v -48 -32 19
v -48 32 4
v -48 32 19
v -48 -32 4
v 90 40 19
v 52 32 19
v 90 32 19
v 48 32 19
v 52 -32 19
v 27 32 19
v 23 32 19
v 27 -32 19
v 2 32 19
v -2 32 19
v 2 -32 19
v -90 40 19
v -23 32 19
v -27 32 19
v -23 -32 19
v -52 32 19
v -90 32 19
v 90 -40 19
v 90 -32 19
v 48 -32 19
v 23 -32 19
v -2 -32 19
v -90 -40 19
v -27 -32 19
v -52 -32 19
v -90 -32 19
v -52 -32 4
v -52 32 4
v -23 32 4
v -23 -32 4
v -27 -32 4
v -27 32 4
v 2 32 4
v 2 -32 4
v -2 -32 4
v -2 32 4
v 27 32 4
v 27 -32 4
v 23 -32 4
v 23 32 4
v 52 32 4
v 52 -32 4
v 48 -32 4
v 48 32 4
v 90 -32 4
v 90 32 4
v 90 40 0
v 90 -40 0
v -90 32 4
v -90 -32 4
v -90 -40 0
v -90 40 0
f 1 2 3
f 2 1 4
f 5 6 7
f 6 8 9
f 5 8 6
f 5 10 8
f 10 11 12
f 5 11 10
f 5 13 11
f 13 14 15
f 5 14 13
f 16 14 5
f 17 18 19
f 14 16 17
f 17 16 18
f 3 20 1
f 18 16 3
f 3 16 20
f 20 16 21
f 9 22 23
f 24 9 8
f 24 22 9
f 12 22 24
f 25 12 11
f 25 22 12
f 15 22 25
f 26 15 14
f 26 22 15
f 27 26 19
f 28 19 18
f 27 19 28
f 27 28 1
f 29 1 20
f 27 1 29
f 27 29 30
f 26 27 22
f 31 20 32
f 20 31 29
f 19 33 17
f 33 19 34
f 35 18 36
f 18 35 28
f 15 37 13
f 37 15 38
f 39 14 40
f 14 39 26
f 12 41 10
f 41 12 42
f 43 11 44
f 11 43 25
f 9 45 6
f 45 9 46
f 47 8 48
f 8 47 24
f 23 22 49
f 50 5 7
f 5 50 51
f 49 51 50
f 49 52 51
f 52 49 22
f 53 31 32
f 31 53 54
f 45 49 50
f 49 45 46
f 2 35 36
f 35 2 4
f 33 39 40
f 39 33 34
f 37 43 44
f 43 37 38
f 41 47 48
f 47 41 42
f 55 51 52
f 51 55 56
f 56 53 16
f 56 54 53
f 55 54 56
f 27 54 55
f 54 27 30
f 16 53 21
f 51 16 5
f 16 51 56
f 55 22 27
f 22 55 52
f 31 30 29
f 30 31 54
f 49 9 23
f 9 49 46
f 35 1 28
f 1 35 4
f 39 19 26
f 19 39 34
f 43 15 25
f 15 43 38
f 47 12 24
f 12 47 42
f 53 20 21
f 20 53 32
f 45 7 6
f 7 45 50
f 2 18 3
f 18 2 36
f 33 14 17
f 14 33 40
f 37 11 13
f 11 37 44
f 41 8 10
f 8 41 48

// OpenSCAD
$fn = 32;

// ----------------------------------------------------------------------
// Rib frame 180 x 80 x 19
// 5 ribs at 25 mm pitch
// ----------------------------------------------------------------------

// --- parameters (mm) ---
frame = [180, 80, 4];  // base plate size (x, y, z)
rail_w = 8;            // side rail width
ribs = 5;              // number of ribs
rib_t = 4;             // rib thickness
rib_h = 15;            // rib height above the base plate
pitch = 25;            // pitch between rib centres

// --- derived feature positions (mm) ---
span = (ribs - 1) * pitch;          // = 100   distance between the outer ribs
origin_x = -span / 2;               // = -50   X of the first rib
rib_len = frame[1] - 2 * rail_w + 2;  // = 66   rib length, 1 mm into each rail
feature_centers = [
  [origin_x + 0 * pitch, 0],
  [origin_x + 1 * pitch, 0],
  [origin_x + 2 * pitch, 0],
  [origin_x + 3 * pitch, 0],
  [origin_x + 4 * pitch, 0]
];   // rib centre line, drives the rib loop

// base plate, two side rails, then the ribs read straight off feature_centers
union() {
  translate([-frame[0] / 2, -frame[1] / 2, 0]) cube(frame);
  translate([-frame[0] / 2, -frame[1] / 2, 0]) cube([frame[0], rail_w, frame[2] + rib_h]);
  translate([-frame[0] / 2, frame[1] / 2 - rail_w, 0]) cube([frame[0], rail_w, frame[2] + rib_h]);
  for (centre = feature_centers)
    translate([centre[0] - rib_t / 2, centre[1] - rib_len / 2, frame[2] - 1])
      cube([rib_t, rib_len, rib_h + 1]);
}
